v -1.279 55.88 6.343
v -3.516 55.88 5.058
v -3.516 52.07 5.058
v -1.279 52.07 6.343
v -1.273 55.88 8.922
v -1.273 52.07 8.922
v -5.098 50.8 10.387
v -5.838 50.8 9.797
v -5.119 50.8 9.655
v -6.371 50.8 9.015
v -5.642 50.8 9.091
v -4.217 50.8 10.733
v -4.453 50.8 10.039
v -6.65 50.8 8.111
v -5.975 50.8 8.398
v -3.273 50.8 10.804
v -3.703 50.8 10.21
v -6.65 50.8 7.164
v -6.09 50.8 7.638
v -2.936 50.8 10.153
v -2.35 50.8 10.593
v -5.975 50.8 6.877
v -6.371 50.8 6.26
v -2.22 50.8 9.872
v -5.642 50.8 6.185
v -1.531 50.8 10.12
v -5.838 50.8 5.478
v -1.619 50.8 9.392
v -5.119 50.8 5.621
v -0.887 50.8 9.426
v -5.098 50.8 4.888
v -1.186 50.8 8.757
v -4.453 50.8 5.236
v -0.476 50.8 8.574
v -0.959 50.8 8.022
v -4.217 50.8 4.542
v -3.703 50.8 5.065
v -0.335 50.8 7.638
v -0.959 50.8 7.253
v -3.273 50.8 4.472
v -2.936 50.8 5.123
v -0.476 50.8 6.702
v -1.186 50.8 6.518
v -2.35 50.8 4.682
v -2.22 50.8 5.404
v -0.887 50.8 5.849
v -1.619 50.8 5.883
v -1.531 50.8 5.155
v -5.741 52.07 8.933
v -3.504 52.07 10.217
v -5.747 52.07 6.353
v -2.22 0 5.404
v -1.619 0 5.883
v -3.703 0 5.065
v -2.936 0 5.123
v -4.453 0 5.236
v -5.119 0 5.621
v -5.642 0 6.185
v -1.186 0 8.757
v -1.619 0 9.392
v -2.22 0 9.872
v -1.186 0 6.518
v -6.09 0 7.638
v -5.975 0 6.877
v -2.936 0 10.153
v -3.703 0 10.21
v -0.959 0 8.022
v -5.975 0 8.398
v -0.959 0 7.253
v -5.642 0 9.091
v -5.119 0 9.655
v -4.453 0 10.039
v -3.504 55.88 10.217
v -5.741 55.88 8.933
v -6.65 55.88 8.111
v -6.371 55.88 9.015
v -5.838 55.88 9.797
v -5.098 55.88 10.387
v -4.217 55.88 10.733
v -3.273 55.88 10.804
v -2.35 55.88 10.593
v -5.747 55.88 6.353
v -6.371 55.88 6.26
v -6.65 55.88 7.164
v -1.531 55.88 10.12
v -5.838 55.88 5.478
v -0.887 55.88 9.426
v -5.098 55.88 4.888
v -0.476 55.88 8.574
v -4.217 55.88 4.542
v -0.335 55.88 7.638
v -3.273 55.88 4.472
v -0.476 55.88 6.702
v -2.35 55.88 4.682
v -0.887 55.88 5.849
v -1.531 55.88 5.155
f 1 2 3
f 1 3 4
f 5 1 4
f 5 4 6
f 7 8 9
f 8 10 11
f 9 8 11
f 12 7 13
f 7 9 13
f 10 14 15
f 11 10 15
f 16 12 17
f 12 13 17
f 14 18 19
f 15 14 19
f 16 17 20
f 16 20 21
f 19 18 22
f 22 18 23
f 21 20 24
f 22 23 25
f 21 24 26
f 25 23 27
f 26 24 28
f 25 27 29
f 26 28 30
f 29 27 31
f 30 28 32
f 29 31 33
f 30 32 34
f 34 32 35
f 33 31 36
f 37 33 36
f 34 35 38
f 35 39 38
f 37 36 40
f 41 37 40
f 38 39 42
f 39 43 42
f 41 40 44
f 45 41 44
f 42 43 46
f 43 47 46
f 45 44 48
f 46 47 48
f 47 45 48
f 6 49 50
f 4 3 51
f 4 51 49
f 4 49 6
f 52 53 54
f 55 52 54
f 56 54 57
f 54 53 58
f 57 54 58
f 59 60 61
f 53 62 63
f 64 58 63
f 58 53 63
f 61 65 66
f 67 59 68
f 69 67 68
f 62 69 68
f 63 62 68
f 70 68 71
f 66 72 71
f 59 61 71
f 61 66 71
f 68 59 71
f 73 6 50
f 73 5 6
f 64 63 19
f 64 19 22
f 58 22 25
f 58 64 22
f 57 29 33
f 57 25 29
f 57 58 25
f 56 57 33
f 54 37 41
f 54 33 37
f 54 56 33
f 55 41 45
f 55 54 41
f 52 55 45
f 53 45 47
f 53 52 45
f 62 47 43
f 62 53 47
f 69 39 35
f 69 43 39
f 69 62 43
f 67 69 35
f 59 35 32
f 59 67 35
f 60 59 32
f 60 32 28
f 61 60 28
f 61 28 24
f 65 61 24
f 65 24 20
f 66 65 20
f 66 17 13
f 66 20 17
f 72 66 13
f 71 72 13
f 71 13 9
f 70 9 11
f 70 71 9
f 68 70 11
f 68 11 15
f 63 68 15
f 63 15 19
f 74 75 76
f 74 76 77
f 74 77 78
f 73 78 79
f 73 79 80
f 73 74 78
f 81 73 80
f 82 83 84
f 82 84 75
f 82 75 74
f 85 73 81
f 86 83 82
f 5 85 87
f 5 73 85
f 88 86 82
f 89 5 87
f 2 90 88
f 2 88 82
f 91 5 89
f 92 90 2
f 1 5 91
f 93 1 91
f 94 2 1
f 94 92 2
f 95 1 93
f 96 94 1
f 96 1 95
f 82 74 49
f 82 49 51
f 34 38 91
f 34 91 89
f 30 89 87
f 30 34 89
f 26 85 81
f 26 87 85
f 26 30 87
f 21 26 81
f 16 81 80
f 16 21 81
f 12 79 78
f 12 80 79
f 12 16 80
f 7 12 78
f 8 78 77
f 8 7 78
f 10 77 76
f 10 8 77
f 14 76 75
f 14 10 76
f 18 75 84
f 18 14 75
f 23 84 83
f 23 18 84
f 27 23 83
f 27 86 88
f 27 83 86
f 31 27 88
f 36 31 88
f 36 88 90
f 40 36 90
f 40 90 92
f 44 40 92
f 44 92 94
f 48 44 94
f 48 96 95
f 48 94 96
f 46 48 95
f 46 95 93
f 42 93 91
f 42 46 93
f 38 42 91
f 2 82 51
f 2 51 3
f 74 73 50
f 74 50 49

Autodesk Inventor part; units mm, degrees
ref_plane "YZ Plane" through (0, 0, 0) normal (1, 0, 0) x (0, 1, 0)
ref_plane "XZ Plane" through (0, 0, 0) normal (0, 1, 0) x (-1, 0, 0)
ref_plane "XY Plane" through (0, 0, 0) normal (0, 0, 1) x (1, 0, 0)
sketch "Sketch1" plane through (0, 0, 0) normal (0, 1, 0) x (-1, 0, 0)
  circle A0 centre (3.5103, 7.6377) radius 2.5797
  point P0 (0, 0)
  dimension "d0" = 5.1594
extrude "Extrusion1" add sketch "Sketch1" along normal blind 50.8
sketch "Sketch2" plane through (-3.5103, 50.8, 7.6377) normal (0, 1, 0) x (1, 0, 0)
  circle A0 centre (0, 0) radius 3.175
  point P0 (3.5103, 7.6377)
  dimension "d3" = 6.35
extrude "Extrusion2" add sketch "Sketch2" along normal blind 5.08
sketch "Sketch3" plane through (-3.5103, 55.88, 7.6377) normal (0, 1, 0) x (1, 0, 0)
  circle A0 centre (0, 0) radius 2.5797 projected
  line L0 (2.231, 1.2951) -> (2.2371, -1.2846)
  line L1 (2.2371, -1.2846) -> (0.006, -2.5797)
  line L2 (0.006, -2.5797) -> (-2.231, -1.2951)
  line L3 (-2.231, -1.2951) -> (-2.2371, 1.2846)
  line L4 (-2.2371, 1.2846) -> (-0.006, 2.5797)
  line L5 (-0.006, 2.5797) -> (2.231, 1.2951)
  point P0 (3.5103, 7.6377)
extrude "Extrusion3" cut sketch "Sketch3" against normal blind 3.81 contours L0 L1 L2 L3 L4 L5
properties part number "Bolt 13_64 Representation"
